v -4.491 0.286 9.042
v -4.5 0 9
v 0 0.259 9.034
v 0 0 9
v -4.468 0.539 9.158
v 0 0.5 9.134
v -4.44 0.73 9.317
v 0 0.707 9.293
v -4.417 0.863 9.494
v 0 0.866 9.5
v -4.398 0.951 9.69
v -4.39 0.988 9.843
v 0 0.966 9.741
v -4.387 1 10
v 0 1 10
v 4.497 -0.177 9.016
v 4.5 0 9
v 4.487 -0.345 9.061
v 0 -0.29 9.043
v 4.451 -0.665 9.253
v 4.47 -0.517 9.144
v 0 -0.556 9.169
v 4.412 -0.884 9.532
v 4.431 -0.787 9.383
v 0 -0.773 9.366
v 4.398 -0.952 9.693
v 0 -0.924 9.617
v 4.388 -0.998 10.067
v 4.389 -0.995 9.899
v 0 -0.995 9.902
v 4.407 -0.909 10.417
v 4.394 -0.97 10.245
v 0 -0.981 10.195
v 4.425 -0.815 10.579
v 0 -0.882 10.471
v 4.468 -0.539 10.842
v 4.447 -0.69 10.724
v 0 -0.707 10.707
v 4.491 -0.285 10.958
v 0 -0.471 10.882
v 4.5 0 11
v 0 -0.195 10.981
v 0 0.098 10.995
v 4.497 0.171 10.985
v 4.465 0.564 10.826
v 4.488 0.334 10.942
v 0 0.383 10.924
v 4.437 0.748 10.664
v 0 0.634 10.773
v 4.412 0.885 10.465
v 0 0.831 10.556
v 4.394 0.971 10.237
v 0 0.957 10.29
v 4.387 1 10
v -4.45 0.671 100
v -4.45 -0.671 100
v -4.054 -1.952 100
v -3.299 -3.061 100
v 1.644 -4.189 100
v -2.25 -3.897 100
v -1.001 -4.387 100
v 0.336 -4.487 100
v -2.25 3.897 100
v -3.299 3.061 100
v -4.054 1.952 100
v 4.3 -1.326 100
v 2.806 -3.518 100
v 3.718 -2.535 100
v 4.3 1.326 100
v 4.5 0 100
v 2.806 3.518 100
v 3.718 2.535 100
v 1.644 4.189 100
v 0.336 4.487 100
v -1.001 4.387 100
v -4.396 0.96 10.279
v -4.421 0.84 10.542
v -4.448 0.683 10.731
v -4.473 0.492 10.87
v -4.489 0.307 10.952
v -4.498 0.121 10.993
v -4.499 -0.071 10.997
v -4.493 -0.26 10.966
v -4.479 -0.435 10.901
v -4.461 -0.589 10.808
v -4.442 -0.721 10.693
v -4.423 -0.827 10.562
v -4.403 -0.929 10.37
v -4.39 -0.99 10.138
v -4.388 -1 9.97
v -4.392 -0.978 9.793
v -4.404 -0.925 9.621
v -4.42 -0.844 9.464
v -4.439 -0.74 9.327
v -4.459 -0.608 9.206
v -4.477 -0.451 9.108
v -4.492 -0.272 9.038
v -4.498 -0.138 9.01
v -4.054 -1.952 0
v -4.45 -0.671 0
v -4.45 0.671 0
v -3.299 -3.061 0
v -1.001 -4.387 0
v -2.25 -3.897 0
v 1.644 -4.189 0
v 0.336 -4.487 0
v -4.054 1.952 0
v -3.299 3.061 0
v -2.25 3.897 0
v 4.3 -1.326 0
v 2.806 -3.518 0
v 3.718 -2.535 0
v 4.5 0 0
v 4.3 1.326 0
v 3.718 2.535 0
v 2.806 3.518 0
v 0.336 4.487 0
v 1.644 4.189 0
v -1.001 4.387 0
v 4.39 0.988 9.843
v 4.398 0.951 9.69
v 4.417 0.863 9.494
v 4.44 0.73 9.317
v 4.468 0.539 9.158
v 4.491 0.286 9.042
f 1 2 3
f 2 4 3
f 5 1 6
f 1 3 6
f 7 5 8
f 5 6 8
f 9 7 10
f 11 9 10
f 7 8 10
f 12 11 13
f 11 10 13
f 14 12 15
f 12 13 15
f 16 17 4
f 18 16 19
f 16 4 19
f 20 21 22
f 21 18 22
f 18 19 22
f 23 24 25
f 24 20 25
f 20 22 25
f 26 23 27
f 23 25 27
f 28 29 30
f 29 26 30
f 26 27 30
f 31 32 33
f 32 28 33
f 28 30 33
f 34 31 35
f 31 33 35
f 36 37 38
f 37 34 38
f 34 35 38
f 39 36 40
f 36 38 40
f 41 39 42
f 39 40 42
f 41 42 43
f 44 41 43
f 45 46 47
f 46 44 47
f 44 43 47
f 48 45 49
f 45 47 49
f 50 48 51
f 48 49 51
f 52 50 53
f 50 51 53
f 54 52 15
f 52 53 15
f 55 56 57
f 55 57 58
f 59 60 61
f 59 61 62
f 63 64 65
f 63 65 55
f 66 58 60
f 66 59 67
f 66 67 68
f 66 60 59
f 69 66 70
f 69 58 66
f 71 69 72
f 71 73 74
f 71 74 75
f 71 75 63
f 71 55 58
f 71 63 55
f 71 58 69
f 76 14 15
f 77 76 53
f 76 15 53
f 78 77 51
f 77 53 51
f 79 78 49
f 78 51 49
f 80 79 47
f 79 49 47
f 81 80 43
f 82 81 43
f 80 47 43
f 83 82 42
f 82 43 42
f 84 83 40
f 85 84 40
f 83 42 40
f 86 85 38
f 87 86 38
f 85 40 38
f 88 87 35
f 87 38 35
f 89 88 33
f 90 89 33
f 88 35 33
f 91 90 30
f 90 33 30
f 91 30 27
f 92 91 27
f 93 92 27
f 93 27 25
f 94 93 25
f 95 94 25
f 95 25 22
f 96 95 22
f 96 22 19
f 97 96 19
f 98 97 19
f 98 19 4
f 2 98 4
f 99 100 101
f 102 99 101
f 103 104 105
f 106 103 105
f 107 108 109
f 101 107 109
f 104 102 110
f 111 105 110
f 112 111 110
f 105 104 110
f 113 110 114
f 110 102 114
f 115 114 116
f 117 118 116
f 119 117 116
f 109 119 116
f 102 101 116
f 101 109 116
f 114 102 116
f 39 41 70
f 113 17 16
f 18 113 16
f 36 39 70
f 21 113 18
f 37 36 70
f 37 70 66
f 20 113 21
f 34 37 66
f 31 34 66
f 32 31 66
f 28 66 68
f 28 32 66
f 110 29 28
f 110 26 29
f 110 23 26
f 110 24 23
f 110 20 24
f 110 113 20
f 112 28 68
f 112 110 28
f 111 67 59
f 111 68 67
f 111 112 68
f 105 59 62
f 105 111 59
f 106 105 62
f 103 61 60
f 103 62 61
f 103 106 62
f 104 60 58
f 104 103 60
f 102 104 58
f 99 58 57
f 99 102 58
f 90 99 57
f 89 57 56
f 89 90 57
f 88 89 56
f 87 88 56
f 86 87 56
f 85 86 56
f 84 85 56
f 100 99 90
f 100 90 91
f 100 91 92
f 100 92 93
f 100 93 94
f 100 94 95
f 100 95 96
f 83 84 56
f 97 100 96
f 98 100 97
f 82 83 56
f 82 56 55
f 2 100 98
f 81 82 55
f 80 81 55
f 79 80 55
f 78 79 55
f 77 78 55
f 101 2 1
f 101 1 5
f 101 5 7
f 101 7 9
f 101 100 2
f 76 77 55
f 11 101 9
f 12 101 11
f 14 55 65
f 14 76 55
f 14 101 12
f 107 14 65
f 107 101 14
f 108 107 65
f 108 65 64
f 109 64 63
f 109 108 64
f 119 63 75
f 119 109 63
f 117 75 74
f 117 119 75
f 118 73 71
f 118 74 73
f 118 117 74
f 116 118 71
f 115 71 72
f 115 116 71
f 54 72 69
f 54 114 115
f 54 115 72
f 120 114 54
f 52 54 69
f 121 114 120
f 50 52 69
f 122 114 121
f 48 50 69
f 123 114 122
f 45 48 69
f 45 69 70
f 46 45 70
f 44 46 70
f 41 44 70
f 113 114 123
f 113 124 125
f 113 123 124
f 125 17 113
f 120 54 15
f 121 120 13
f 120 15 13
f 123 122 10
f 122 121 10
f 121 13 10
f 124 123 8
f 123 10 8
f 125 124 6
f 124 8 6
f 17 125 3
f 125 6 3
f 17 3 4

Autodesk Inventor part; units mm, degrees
ref_plane "YZ Plane" through (0, 0, 0) normal (1, 0, 0) x (0, 1, 0)
ref_plane "XZ Plane" through (0, 0, 0) normal (0, 1, 0) x (-1, 0, 0)
ref_plane "XY Plane" through (0, 0, 0) normal (0, 0, 1) x (1, 0, 0)
sketch "Sketch1" plane through (0, 0, 0) normal (0, 0, 1) x (1, 0, 0)
  circle A0 centre (0, 0) radius 4.5
  dimension "d0" = 9
extrude "Extrusion1" add sketch "Sketch1" along normal blind 100
sketch "Sketch2" plane through (0, 0, 0) normal (1, 0, 0) x (0, 1, 0)
  line L0 (0, 0) -> (0, 1)
  line L1 (0, 0) -> (0, 6.35)
  line L2 (0, 0) -> (-10, 0)
  line L3 (-4.5, 0) -> (4.5, 0) projected
  line L4 (0, 0) -> (0, 9.525)
  line L5 (0, 9.525) -> (0, 0)
  line L6 (0, 0) -> (0, 10)
  circle A0 centre (0, 10) radius 1
  dimension "d3" = 1
  dimension "d4" = 10
  dimension "d5" = 10
  dimension "d6" = 2
extrude "Extrusion2" cut sketch "Sketch2" along normal through all both and the other way through all
thread "Thread1" size "M9x1.25" class "6g" standard "ANSI Metric M Profile" full length
properties part number "1"
